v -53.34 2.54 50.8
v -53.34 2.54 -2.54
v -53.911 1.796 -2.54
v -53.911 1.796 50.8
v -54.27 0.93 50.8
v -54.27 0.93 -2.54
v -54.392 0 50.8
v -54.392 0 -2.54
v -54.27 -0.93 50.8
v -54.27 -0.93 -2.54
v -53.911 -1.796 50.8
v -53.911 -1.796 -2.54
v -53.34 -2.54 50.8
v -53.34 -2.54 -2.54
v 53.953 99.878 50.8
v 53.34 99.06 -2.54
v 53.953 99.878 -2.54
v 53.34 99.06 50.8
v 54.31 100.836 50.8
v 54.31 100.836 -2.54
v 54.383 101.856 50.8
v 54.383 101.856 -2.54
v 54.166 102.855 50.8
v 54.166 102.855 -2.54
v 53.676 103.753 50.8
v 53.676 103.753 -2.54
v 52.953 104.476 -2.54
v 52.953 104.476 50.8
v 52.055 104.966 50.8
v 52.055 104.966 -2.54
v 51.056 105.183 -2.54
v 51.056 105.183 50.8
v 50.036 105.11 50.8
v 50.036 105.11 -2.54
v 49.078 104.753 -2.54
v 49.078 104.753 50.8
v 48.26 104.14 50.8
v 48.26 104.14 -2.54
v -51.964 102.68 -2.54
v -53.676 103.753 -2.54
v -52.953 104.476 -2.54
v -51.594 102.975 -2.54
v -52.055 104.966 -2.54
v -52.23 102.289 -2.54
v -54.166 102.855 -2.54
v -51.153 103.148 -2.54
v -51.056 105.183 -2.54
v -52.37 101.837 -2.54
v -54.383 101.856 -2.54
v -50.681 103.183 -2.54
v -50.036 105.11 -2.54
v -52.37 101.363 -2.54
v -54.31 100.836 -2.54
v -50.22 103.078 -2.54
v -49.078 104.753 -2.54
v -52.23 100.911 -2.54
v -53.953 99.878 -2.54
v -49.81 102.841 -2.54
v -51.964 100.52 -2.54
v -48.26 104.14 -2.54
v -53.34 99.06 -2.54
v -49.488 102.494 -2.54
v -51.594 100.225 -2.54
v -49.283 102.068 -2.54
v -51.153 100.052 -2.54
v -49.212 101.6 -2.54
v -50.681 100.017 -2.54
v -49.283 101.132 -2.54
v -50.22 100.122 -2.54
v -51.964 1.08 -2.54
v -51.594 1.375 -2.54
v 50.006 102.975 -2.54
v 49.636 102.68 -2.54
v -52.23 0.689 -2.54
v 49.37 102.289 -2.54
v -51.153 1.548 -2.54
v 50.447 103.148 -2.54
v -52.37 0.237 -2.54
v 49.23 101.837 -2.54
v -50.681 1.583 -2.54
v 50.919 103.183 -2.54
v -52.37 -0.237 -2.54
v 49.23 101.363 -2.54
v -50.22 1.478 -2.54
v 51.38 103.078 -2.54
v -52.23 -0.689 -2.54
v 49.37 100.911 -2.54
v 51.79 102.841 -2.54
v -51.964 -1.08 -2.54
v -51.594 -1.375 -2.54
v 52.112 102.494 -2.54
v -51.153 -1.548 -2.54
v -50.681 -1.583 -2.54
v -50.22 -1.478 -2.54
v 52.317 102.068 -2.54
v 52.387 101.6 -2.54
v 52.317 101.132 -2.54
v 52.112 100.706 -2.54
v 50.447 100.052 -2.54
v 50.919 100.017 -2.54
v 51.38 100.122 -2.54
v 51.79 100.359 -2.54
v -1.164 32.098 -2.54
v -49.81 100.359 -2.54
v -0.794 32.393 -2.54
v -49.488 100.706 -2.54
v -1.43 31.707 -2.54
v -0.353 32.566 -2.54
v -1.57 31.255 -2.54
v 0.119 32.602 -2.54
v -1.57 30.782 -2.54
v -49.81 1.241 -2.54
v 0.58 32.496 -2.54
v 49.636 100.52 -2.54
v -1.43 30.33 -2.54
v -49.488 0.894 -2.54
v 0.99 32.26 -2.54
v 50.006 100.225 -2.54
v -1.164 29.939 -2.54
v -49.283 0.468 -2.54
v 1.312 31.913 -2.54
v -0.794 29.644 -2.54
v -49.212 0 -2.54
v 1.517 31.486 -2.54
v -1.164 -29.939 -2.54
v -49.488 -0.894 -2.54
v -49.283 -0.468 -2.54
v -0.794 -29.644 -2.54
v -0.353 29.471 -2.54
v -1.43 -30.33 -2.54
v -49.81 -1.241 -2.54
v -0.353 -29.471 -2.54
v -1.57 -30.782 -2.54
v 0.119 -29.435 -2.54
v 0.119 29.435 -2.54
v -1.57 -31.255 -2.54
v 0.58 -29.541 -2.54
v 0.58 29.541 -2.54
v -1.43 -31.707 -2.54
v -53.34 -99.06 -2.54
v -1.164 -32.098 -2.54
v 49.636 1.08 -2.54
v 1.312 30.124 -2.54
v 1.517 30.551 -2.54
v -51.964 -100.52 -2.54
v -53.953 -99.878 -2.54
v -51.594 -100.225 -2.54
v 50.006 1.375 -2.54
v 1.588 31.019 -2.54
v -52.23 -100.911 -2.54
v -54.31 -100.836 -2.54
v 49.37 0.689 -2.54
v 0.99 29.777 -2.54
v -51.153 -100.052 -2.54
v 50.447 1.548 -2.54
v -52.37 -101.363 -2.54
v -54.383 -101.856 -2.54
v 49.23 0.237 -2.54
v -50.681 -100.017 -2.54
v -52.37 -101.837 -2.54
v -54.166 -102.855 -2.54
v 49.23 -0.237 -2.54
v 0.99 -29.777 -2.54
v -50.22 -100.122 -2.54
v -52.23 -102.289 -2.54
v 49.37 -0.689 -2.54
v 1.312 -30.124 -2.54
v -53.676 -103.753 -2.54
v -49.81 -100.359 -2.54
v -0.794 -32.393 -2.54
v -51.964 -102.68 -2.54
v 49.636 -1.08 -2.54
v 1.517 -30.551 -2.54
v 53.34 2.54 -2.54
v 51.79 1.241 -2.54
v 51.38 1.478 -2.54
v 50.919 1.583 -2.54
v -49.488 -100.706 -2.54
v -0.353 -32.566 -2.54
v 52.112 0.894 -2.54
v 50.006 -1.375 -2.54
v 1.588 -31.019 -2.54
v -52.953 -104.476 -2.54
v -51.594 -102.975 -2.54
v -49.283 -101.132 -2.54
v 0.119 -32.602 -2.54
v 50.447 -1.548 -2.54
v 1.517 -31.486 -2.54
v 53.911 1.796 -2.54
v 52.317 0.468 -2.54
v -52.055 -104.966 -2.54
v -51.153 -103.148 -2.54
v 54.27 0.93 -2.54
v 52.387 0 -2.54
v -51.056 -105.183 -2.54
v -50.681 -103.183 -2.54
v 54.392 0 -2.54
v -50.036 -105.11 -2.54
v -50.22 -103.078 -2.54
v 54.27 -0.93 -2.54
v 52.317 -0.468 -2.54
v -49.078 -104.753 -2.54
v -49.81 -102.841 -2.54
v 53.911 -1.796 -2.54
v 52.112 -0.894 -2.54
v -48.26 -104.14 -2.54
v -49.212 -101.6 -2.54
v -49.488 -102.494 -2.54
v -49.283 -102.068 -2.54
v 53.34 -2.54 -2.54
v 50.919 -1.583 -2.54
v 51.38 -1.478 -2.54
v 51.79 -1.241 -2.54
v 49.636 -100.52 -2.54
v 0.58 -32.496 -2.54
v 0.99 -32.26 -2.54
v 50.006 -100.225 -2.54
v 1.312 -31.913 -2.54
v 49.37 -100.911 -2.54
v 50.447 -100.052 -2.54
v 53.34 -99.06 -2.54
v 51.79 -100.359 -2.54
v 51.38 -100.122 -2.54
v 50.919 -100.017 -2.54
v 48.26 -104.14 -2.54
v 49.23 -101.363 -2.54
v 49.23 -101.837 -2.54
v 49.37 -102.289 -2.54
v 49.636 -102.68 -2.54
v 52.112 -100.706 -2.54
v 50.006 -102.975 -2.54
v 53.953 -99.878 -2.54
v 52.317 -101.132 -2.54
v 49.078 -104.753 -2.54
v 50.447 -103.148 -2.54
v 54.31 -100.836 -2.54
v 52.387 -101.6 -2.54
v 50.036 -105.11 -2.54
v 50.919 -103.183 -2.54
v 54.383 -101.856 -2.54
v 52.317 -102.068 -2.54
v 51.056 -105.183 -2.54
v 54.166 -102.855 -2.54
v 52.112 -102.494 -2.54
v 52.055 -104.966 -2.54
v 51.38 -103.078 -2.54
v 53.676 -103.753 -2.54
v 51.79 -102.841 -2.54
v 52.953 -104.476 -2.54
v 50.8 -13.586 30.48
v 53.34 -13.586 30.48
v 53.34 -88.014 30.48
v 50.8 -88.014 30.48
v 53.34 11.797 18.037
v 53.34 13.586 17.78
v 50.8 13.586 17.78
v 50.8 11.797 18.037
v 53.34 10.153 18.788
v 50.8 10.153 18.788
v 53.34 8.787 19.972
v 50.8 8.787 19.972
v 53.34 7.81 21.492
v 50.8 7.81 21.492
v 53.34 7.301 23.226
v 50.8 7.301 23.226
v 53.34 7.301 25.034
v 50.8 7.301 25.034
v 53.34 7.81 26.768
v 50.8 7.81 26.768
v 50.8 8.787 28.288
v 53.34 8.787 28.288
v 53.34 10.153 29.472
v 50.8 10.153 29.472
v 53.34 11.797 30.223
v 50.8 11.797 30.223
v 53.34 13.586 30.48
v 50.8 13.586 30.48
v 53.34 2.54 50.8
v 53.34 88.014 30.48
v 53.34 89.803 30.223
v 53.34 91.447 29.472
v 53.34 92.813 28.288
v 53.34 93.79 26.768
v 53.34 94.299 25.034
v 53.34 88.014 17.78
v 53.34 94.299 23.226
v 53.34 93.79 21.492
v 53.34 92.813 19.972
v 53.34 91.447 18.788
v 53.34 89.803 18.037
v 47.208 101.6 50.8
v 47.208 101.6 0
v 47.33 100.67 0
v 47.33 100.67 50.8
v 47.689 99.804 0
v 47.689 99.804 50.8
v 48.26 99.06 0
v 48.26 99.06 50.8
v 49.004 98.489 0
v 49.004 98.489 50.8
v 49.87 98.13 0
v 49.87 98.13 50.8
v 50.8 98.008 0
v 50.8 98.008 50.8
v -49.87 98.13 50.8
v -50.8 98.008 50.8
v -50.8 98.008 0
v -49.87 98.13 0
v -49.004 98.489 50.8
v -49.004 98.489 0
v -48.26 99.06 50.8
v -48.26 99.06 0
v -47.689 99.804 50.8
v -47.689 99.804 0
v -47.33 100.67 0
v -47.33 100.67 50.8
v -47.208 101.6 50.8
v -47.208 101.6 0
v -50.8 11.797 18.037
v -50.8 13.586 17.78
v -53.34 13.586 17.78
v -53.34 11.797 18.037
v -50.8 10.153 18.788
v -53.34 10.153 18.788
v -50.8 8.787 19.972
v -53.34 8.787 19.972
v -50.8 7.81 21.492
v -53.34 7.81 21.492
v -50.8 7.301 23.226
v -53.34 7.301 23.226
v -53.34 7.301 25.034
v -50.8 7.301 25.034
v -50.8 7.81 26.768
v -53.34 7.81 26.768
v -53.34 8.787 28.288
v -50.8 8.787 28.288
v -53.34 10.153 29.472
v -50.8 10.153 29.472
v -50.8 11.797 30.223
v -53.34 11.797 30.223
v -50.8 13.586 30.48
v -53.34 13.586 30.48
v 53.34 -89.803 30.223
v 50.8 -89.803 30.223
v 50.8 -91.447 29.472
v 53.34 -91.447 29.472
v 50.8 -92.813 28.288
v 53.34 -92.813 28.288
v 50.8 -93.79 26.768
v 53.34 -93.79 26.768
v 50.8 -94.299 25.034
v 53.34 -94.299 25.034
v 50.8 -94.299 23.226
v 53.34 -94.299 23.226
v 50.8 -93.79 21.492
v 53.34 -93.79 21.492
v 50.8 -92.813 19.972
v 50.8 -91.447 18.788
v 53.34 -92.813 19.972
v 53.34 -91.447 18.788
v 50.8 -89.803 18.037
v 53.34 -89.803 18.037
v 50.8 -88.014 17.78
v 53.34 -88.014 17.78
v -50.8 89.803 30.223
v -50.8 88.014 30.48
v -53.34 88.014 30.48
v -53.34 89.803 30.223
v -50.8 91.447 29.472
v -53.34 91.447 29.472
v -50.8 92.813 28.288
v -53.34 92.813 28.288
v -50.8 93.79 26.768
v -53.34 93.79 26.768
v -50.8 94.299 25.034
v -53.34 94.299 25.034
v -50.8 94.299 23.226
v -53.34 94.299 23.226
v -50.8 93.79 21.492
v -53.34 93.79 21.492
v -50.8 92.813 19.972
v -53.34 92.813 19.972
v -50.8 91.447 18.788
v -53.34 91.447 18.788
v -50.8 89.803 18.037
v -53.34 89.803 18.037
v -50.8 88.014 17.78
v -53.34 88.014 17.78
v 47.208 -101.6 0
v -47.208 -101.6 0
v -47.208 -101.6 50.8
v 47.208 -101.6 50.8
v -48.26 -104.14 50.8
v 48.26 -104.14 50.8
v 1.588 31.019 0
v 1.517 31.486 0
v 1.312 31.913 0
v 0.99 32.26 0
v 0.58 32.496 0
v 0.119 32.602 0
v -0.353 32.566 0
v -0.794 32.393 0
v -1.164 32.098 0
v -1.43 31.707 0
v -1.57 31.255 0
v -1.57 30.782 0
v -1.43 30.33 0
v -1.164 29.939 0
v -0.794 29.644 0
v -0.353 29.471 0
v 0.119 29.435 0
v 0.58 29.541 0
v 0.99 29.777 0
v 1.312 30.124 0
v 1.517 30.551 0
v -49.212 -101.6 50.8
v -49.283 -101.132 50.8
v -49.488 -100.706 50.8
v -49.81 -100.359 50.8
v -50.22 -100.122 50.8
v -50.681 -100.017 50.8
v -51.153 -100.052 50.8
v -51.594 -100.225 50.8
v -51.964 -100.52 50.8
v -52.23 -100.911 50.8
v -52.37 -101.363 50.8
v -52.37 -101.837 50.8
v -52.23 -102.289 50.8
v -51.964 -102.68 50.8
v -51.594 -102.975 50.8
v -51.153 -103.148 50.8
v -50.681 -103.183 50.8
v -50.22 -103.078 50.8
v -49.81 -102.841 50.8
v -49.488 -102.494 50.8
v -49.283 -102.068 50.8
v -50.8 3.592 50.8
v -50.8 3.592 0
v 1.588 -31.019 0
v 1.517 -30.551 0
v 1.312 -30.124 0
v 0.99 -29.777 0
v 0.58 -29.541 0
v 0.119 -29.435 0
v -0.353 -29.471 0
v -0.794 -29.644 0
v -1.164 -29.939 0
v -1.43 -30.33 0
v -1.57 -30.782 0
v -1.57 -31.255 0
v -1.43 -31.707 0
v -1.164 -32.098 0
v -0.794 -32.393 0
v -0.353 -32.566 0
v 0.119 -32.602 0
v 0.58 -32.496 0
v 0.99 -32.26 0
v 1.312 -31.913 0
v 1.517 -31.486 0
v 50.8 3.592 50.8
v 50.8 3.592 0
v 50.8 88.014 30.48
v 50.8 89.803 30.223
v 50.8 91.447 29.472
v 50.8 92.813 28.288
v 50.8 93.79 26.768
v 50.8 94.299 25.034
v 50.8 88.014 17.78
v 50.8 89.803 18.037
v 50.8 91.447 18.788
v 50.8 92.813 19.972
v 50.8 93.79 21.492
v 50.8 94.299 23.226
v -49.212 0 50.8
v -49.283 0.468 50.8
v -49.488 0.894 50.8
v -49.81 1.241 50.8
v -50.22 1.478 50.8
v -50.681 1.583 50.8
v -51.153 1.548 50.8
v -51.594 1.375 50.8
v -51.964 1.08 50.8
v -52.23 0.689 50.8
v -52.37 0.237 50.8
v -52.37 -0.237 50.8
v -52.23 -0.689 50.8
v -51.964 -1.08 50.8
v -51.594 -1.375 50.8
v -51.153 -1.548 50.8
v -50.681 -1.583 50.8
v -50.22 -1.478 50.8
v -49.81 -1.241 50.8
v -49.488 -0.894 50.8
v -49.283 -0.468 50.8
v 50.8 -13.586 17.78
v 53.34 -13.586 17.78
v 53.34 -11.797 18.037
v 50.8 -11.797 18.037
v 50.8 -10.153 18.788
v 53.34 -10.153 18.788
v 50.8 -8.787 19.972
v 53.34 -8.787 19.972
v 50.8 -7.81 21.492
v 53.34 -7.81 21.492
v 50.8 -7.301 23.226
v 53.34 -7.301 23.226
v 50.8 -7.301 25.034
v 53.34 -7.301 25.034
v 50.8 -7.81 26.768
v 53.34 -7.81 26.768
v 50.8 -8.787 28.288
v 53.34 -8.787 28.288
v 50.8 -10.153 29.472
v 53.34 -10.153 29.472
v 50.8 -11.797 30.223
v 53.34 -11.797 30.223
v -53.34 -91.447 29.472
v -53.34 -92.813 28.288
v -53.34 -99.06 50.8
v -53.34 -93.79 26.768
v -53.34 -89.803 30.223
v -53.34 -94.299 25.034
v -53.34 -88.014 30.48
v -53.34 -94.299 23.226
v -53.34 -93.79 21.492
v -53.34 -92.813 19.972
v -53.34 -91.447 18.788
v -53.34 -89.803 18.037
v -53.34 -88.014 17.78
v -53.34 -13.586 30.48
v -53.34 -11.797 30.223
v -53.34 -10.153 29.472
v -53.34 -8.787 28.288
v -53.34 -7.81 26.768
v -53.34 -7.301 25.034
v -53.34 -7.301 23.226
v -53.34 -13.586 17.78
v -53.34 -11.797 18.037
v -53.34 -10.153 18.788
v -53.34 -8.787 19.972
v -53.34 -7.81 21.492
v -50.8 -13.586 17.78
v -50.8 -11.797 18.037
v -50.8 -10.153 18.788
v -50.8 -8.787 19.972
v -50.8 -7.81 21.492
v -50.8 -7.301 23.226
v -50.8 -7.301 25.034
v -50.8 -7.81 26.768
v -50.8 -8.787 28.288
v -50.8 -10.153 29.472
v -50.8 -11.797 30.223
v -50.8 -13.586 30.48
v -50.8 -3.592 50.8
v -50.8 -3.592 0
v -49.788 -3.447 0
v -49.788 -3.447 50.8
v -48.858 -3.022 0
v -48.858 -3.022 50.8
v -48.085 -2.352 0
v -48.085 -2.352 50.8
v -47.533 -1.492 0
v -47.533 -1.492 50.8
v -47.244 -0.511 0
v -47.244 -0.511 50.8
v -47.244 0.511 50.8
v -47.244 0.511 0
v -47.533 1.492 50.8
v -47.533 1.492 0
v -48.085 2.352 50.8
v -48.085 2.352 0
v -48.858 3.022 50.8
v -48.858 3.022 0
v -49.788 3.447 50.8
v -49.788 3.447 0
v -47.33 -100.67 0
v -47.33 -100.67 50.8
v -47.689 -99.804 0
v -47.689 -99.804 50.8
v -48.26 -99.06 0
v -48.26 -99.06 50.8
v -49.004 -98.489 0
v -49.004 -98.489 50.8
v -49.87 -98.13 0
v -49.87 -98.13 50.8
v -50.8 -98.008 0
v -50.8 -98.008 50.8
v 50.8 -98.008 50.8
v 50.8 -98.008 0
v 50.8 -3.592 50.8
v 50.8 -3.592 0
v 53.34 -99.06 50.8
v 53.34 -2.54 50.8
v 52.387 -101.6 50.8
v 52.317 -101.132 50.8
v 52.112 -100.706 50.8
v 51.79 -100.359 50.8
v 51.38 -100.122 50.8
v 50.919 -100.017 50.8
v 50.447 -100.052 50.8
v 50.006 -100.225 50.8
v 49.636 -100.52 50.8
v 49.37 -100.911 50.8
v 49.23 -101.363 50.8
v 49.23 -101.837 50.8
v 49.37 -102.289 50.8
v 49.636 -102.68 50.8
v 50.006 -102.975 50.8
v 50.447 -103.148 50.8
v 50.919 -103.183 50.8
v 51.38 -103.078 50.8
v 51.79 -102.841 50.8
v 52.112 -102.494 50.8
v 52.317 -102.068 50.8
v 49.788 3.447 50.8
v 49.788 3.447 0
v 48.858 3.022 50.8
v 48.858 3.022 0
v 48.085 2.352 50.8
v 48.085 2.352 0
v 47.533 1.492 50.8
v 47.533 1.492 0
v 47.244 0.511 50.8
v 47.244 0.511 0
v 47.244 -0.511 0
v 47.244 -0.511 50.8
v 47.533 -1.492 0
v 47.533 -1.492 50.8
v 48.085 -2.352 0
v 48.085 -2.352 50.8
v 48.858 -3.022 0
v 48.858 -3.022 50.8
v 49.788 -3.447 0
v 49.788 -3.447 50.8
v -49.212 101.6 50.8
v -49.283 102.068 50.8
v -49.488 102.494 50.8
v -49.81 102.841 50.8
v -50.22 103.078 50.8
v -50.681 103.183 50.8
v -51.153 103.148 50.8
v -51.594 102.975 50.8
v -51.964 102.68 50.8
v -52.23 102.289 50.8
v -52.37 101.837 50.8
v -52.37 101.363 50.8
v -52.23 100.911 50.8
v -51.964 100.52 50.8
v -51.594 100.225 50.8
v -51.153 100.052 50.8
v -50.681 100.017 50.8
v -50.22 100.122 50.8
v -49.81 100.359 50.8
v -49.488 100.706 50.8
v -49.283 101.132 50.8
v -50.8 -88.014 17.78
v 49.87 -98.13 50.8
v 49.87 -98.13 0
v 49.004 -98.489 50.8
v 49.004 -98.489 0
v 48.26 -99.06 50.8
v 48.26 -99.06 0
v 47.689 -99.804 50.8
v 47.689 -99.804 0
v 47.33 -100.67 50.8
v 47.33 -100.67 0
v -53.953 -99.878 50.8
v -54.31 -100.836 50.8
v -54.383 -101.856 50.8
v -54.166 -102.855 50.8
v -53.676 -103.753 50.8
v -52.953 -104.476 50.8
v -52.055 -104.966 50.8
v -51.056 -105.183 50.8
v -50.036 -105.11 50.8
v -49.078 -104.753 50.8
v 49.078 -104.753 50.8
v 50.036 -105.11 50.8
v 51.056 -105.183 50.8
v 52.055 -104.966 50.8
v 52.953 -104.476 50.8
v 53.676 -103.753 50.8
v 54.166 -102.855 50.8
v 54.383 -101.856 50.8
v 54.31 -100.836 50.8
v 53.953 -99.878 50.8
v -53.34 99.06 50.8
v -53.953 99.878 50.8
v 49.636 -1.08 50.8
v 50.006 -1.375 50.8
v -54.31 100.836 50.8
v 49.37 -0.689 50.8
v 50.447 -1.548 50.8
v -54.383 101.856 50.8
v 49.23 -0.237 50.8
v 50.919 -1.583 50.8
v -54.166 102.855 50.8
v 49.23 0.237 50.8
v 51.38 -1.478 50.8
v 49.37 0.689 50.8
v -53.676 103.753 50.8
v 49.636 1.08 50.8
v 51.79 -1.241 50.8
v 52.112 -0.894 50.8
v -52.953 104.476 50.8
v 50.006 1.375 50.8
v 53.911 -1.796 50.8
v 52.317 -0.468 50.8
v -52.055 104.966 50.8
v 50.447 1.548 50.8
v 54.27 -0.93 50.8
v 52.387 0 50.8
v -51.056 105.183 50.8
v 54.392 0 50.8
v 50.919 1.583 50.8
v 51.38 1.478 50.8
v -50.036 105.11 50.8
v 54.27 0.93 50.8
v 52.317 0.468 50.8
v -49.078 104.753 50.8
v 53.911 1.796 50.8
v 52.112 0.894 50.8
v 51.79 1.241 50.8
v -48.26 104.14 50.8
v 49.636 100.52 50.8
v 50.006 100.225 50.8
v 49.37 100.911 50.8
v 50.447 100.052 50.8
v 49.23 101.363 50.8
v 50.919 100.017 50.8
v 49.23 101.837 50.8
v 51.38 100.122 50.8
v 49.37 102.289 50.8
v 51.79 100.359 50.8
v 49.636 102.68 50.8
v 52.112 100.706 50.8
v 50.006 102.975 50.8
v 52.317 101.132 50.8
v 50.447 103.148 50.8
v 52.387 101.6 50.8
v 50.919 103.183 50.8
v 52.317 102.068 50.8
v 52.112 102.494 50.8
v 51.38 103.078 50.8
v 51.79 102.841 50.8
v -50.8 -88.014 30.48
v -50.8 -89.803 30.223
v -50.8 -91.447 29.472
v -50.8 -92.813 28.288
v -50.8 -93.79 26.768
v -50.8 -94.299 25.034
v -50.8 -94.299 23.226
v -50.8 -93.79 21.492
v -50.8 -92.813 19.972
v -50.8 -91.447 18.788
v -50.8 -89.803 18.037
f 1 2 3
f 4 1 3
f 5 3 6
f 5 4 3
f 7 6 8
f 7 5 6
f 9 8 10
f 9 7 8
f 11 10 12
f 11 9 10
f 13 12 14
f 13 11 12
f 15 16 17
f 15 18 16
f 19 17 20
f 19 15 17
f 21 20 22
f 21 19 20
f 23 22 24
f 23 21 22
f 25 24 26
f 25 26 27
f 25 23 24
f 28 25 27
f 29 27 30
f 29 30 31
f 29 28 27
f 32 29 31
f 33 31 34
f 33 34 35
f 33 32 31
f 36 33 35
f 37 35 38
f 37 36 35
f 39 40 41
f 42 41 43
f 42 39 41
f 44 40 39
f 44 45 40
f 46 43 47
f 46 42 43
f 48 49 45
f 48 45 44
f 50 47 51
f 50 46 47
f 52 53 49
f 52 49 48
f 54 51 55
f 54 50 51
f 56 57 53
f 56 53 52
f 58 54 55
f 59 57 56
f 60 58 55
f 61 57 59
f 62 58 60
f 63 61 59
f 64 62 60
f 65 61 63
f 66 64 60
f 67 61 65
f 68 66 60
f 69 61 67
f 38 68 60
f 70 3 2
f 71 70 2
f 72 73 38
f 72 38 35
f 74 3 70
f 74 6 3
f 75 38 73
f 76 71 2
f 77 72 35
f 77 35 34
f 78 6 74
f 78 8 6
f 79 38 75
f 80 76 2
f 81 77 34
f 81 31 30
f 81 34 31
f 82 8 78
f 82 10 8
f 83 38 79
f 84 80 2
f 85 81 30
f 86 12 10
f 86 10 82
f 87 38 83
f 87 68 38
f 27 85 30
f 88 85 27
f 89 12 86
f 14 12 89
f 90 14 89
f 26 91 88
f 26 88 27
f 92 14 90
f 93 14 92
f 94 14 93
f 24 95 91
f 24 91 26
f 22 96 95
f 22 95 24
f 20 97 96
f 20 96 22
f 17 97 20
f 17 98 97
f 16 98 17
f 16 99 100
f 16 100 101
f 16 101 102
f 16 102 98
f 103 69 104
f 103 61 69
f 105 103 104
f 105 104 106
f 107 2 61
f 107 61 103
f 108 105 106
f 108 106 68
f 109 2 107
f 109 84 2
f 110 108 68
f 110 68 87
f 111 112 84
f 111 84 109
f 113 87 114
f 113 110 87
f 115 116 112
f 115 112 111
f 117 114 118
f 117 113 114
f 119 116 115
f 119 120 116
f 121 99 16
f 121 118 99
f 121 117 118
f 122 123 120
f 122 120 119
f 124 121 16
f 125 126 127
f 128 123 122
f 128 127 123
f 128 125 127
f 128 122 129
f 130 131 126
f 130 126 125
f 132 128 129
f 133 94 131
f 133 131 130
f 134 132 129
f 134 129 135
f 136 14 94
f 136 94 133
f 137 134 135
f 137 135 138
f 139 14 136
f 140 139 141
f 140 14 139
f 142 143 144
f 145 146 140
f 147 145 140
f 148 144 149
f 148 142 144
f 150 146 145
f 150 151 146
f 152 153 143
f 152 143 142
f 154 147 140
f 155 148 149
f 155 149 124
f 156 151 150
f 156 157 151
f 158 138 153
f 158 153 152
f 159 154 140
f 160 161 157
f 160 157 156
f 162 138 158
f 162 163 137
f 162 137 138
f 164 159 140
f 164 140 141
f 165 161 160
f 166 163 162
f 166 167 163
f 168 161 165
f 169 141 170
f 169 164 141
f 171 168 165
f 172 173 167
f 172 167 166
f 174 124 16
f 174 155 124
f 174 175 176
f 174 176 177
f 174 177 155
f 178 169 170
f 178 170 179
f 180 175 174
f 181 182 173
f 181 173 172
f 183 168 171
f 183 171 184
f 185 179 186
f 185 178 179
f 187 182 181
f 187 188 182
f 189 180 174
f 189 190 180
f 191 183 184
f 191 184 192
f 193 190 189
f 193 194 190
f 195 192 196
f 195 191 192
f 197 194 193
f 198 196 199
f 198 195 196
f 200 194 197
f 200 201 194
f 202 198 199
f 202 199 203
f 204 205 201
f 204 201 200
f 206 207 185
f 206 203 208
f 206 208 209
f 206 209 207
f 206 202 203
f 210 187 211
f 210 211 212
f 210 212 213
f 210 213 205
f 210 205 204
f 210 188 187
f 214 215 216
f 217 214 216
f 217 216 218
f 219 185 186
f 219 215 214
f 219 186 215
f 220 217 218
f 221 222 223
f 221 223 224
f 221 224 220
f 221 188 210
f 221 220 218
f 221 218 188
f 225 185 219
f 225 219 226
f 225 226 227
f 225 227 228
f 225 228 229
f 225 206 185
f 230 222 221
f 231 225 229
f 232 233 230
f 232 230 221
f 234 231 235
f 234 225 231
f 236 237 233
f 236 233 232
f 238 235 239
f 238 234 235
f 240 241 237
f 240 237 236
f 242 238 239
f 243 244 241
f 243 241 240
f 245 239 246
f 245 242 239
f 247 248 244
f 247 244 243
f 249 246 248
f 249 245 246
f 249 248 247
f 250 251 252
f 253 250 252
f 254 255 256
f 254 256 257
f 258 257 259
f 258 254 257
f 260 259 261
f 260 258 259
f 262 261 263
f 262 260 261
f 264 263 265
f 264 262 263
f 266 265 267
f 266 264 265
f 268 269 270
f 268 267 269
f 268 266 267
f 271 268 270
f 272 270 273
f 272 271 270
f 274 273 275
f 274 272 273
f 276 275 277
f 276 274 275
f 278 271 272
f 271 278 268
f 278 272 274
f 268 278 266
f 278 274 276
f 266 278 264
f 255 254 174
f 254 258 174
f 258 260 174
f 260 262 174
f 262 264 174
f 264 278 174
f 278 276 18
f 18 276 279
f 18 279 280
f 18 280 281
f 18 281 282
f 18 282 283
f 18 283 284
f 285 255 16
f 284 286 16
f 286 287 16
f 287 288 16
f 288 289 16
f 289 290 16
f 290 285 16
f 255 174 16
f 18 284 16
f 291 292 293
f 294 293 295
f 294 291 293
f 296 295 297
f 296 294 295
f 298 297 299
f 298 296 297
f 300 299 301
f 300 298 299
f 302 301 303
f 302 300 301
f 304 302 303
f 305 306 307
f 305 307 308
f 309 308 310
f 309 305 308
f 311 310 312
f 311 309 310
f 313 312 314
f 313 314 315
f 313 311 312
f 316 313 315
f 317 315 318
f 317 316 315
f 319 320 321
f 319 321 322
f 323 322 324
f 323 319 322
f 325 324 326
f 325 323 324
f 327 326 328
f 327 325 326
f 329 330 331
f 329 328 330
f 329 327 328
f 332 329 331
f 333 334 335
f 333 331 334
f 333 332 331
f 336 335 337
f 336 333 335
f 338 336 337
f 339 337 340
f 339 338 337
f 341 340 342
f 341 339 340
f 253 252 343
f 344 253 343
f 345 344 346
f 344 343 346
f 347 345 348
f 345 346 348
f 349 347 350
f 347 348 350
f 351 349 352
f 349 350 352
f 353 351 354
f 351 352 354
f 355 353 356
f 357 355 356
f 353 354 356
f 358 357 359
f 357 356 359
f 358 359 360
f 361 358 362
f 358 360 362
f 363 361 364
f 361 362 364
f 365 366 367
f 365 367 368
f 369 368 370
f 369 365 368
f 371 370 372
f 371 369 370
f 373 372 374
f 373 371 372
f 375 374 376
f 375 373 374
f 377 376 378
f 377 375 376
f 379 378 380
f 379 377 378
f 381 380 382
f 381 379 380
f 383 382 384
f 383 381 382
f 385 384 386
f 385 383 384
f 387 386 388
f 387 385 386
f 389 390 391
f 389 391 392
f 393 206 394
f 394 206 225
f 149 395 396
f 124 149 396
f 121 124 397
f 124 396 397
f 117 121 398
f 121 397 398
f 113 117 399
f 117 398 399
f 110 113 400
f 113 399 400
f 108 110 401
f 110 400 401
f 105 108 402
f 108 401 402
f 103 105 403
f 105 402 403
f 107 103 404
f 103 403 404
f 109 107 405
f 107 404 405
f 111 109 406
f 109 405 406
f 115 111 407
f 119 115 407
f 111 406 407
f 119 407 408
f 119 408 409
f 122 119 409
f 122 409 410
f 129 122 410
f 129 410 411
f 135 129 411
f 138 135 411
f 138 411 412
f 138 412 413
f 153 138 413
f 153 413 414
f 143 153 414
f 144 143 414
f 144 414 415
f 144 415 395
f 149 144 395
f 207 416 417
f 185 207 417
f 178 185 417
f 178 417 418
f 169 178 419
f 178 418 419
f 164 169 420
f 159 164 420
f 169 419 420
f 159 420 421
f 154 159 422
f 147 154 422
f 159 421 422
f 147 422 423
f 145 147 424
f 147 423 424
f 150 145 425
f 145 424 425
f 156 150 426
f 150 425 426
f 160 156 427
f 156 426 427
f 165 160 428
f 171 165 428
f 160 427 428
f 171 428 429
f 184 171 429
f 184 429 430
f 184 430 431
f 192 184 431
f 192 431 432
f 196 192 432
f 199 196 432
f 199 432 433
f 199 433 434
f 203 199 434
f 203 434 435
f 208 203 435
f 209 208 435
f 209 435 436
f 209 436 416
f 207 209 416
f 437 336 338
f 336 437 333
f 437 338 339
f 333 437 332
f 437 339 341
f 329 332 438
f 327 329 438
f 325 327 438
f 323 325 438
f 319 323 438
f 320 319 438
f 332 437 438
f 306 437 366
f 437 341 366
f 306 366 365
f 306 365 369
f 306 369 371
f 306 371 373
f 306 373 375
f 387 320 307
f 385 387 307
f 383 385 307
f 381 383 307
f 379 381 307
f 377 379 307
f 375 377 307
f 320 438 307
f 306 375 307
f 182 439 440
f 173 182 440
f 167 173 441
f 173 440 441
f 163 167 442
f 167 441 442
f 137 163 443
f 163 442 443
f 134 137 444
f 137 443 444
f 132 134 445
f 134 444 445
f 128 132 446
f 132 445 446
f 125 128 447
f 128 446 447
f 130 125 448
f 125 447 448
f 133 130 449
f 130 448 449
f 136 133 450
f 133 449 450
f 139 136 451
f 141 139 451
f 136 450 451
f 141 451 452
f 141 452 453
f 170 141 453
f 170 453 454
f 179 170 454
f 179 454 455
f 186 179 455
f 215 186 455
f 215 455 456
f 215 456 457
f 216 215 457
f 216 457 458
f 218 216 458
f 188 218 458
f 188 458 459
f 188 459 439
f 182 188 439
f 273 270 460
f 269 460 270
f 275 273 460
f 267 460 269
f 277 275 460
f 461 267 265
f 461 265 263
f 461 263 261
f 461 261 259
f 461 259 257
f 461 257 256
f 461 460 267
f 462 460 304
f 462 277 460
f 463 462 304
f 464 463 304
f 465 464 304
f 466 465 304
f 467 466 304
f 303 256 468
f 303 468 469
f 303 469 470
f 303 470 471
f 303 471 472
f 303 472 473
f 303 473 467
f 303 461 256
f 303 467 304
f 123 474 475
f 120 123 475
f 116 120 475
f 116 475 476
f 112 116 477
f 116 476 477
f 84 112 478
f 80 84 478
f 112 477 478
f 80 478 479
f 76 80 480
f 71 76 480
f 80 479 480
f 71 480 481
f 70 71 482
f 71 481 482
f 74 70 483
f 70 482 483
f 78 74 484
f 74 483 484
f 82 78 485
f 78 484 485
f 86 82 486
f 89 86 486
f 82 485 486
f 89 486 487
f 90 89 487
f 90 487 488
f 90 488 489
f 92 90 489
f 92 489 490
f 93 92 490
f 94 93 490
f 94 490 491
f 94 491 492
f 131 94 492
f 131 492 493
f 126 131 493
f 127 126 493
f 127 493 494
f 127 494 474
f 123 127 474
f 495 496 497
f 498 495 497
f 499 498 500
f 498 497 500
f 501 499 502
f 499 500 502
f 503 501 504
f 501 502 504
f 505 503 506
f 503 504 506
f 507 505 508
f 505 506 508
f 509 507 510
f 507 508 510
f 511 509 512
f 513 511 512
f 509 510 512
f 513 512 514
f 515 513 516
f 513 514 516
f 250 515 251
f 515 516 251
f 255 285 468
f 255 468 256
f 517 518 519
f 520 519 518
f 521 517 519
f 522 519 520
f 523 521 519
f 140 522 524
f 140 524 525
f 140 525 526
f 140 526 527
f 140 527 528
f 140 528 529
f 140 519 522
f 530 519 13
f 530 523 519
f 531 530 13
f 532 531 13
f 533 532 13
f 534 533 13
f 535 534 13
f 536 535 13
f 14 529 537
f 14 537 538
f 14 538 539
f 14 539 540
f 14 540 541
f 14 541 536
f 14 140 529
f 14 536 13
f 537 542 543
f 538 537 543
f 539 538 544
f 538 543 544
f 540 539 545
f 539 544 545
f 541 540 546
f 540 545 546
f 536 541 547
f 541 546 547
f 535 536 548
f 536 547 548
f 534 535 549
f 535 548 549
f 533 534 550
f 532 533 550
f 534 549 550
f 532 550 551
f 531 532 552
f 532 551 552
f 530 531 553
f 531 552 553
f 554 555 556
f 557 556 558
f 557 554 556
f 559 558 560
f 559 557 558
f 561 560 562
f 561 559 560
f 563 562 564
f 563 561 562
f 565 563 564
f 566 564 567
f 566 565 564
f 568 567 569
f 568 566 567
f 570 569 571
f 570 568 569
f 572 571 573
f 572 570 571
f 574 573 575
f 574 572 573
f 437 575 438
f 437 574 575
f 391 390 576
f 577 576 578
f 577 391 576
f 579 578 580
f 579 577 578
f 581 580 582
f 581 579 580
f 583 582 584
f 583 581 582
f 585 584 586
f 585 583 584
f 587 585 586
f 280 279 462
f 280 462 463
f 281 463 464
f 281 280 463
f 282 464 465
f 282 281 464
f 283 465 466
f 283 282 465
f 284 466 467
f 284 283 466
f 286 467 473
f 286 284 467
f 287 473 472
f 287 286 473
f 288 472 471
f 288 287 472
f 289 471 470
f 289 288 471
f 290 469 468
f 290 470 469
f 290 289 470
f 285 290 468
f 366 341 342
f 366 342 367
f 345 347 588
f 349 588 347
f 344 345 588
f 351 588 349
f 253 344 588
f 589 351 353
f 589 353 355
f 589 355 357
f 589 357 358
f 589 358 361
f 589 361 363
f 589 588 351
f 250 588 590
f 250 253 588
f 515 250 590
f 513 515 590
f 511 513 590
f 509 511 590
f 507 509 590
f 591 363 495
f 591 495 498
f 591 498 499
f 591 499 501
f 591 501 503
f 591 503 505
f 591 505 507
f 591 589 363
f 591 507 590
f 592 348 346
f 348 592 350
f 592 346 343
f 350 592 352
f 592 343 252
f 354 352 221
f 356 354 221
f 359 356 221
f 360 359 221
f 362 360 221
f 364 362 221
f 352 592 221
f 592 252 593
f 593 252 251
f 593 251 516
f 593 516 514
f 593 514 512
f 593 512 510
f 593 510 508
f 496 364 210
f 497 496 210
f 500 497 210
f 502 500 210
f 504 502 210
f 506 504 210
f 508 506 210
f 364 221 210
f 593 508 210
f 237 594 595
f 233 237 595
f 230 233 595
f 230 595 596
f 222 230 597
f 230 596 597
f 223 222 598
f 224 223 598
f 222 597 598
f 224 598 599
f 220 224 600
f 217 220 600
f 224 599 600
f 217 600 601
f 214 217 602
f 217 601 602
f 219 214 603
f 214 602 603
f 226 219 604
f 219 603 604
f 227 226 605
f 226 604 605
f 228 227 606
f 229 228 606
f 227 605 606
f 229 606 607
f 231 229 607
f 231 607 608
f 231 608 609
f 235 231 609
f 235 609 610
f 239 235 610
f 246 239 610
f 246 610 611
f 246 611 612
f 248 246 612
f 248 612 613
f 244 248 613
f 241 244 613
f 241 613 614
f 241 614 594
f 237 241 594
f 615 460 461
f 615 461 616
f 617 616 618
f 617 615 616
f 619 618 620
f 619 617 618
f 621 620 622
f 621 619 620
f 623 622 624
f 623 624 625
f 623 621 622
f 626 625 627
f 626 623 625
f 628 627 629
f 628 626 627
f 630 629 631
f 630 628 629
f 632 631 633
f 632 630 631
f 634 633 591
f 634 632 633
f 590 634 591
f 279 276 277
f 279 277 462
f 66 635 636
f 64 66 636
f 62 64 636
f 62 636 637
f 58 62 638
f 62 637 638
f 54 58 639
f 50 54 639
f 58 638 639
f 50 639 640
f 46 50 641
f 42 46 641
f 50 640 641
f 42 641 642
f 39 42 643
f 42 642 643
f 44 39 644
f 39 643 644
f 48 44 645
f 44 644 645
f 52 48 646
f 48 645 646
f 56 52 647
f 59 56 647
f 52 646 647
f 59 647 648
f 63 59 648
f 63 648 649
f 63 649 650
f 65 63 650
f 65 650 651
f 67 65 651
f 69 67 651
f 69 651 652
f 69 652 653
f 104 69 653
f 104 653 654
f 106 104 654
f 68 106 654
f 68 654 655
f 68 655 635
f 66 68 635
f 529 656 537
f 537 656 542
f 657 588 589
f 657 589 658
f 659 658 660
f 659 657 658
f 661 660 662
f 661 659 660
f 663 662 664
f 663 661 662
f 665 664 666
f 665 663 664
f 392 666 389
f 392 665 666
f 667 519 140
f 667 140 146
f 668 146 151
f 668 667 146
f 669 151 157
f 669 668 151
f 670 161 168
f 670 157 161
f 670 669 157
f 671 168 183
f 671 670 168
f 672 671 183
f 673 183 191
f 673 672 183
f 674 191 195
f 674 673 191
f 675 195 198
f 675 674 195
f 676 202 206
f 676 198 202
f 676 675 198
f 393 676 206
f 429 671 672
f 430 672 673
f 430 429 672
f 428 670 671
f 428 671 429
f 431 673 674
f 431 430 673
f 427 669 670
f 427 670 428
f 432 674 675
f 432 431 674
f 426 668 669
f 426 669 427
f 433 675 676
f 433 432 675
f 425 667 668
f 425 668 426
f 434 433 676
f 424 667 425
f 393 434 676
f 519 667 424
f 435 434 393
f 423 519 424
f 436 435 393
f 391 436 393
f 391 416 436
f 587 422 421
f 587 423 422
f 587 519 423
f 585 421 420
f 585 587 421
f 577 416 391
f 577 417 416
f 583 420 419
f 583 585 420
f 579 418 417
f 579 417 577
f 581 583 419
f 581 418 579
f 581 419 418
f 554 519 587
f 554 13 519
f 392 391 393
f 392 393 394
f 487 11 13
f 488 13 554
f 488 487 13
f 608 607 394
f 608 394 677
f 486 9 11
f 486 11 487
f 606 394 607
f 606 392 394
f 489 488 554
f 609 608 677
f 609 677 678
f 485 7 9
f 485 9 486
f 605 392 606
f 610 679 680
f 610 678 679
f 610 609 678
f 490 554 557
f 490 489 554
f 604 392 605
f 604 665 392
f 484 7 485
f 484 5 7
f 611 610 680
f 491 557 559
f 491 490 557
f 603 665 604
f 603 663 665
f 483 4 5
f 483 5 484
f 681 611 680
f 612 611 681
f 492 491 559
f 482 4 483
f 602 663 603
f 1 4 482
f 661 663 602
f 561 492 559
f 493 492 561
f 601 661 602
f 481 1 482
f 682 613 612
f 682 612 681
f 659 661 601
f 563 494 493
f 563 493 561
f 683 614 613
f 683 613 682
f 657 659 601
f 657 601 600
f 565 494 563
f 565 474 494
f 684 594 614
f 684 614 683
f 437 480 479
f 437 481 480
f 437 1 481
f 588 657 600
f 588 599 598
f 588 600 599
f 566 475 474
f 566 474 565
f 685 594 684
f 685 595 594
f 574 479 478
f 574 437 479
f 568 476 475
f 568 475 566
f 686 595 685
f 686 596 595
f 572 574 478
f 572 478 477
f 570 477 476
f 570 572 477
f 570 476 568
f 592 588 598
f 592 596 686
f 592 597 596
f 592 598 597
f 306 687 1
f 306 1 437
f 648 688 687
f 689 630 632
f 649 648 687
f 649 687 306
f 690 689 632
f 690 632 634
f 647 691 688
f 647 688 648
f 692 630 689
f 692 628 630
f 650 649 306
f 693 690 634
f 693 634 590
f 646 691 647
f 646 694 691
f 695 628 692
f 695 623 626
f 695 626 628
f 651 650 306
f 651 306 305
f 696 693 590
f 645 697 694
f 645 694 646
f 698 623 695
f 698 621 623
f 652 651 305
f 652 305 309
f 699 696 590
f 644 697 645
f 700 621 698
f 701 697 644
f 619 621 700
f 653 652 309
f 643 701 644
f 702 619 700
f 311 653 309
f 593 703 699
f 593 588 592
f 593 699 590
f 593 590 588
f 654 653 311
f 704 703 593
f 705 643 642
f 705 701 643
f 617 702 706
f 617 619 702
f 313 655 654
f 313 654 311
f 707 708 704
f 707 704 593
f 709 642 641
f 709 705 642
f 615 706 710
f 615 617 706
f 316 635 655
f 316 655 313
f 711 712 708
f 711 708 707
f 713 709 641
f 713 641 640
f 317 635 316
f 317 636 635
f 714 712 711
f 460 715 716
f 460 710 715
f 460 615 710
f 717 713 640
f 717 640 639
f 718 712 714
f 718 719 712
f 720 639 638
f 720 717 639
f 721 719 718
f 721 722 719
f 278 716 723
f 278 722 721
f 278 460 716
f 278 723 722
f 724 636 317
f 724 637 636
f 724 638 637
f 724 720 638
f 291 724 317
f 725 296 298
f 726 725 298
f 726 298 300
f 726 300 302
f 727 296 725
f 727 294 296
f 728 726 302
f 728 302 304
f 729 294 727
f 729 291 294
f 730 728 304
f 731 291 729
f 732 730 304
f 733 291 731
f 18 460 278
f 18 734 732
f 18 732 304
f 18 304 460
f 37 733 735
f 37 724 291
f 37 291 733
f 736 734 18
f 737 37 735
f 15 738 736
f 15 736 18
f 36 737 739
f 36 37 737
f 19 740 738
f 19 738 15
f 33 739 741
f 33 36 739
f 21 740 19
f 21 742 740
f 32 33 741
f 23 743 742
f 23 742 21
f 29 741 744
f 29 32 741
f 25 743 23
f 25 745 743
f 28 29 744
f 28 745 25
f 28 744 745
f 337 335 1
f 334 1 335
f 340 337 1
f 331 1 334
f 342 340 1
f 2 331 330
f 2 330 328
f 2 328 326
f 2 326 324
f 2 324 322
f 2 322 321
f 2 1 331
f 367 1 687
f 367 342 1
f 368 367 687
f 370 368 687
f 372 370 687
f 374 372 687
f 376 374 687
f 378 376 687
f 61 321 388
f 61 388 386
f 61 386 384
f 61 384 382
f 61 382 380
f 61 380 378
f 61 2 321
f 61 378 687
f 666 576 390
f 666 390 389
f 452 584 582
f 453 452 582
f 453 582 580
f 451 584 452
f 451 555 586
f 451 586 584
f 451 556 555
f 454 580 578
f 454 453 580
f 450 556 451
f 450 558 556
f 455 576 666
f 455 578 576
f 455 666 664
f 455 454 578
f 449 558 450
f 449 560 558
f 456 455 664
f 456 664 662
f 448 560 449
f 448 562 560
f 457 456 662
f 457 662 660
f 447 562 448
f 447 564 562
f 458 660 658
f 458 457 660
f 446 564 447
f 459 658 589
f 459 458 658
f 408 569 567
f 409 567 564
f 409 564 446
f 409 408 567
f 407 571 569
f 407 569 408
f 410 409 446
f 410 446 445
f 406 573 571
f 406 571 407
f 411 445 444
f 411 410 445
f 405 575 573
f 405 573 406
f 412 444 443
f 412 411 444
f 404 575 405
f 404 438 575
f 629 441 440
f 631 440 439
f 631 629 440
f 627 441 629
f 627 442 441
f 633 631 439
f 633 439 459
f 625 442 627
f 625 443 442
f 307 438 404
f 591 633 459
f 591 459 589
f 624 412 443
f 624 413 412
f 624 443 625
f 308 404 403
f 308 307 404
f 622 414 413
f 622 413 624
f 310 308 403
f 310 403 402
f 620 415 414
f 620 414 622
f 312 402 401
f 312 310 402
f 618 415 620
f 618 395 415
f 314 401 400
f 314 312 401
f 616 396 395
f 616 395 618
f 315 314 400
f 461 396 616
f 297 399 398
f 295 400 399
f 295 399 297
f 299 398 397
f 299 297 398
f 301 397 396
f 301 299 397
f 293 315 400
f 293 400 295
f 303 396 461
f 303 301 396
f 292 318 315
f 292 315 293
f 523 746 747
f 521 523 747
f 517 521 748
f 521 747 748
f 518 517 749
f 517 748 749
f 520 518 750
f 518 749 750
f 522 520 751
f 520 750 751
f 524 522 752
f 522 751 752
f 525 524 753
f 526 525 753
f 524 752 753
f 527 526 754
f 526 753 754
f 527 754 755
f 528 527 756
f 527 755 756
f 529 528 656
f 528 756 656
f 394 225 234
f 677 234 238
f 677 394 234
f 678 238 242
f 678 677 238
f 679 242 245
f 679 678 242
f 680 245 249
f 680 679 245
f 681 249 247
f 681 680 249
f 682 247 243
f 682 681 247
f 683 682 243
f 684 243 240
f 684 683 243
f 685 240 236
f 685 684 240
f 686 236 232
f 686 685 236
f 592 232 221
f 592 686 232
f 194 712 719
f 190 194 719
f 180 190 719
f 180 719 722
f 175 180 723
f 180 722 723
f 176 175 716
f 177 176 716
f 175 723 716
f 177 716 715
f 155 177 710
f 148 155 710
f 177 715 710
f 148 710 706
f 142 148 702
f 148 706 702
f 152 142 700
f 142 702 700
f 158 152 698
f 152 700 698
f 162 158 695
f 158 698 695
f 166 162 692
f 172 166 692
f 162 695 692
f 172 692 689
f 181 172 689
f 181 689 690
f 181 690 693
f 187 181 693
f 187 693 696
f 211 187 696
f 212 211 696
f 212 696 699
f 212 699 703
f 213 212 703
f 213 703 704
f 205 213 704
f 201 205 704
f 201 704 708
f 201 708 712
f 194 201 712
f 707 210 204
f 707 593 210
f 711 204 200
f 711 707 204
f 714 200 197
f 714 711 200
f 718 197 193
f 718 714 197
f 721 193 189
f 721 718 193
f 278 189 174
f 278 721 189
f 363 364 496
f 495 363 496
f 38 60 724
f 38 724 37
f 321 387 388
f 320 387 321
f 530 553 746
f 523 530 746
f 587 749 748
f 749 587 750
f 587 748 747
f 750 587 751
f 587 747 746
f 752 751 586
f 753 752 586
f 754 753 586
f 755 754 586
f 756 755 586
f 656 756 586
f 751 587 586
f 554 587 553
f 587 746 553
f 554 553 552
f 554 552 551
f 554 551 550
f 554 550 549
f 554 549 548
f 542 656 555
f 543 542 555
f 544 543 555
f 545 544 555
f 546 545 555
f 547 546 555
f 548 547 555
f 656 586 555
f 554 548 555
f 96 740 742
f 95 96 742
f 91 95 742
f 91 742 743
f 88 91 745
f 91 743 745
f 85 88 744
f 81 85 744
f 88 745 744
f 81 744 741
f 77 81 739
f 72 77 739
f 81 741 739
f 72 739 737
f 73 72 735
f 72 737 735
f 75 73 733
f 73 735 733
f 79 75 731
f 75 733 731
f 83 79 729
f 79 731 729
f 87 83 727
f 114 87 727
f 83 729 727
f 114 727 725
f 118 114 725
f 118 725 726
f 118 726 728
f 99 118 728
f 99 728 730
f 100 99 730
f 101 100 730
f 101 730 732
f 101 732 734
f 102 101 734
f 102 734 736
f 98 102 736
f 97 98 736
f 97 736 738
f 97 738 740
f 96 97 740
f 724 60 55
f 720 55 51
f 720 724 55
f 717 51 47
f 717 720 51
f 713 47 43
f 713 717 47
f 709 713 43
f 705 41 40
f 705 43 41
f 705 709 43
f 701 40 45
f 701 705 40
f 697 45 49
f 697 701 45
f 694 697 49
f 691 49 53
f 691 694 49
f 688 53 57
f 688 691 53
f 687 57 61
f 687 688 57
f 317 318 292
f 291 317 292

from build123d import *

# Parameters (mm, degrees)
SKETCH1_W           = 101.6
SKETCH1_H           = 203.2
BOSS_EXTRUDE1_DEPTH = 50.8
SHELL1_T            = 2.54
SKETCH2_R           = 1.5875
CUT_EXTRUDE1_DEPTH  = 50.8
BOSS_EXTRUDE2_REACH = 130.59
SKETCH3_R           = 3.592102448
SKETCH4_R           = 1.5875
CUT_EXTRUDE2_DEPTH  = 130.880848574
CUT_EXTRUDE3_DEPTH  = 159.909484662


with BuildPart() as part:
    # Sketch1 → Boss-Extrude1 (new body)
    with BuildSketch(Plane.XY):
        Rectangle(SKETCH1_W, SKETCH1_H)
    extrude(amount=BOSS_EXTRUDE1_DEPTH)

    # Shell1
    shell1_openings = [part.faces().sort_by_distance(p)[0] for p in [
        (0, 0, 50.8),
    ]]
    offset(amount=SHELL1_T, openings=shell1_openings, kind=Kind.INTERSECTION)

    # Sketch2 → Cut-Extrude1 (cut)
    with BuildSketch(Plane.XY):
        with Locations((0, 31.018508685)):
            Circle(SKETCH2_R)
        with Locations((0, -31.018508685)):
            Circle(SKETCH2_R)
    extrude(amount=-CUT_EXTRUDE1_DEPTH, mode=Mode.SUBTRACT)

    # Boss-Extrude2: up to this face of the body (flat: up to its plane)
    boss_extrude2_end = Plane(part.part.faces().sort_by_distance((0, 0, -2.54))[0])
    # Sketch3 → Boss-Extrude2 (add, up to the picked face)
    with BuildSketch(Plane.XY.offset(50.8), mode=Mode.PRIVATE) as boss_extrude2_sk1:
        with Locations((-50.8, 101.6)):
            Circle(SKETCH3_R)
    boss_extrude2_tool1 = split(extrude(boss_extrude2_sk1.sketch, amount=-BOSS_EXTRUDE2_REACH, mode=Mode.PRIVATE), bisect_by=boss_extrude2_end, keep=Keep.BOTH, mode=Mode.PRIVATE)
    # Sketch3 → Boss-Extrude2 (add, up to the picked face)
    with BuildSketch(Plane.XY.offset(50.8), mode=Mode.PRIVATE) as boss_extrude2_sk2:
        with Locations((50.8, 101.6)):
            Circle(SKETCH3_R)
    boss_extrude2_tool2 = split(extrude(boss_extrude2_sk2.sketch, amount=-BOSS_EXTRUDE2_REACH, mode=Mode.PRIVATE), bisect_by=boss_extrude2_end, keep=Keep.BOTH, mode=Mode.PRIVATE)
    # Sketch3 → Boss-Extrude2 (add, up to the picked face)
    with BuildSketch(Plane.XY.offset(50.8), mode=Mode.PRIVATE) as boss_extrude2_sk3:
        with Locations((50.8, -101.6)):
            Circle(SKETCH3_R)
    boss_extrude2_tool3 = split(extrude(boss_extrude2_sk3.sketch, amount=-BOSS_EXTRUDE2_REACH, mode=Mode.PRIVATE), bisect_by=boss_extrude2_end, keep=Keep.BOTH, mode=Mode.PRIVATE)
    # Sketch3 → Boss-Extrude2 (add, up to the picked face)
    with BuildSketch(Plane.XY.offset(50.8), mode=Mode.PRIVATE) as boss_extrude2_sk4:
        with Locations((-50.8, -101.6)):
            Circle(SKETCH3_R)
    boss_extrude2_tool4 = split(extrude(boss_extrude2_sk4.sketch, amount=-BOSS_EXTRUDE2_REACH, mode=Mode.PRIVATE), bisect_by=boss_extrude2_end, keep=Keep.BOTH, mode=Mode.PRIVATE)
    # Sketch3 → Boss-Extrude2 (add, up to the picked face)
    with BuildSketch(Plane.XY.offset(50.8), mode=Mode.PRIVATE) as boss_extrude2_sk5:
        with Locations((-50.8, 0)):
            Circle(SKETCH3_R)
    boss_extrude2_tool5 = split(extrude(boss_extrude2_sk5.sketch, amount=-BOSS_EXTRUDE2_REACH, mode=Mode.PRIVATE), bisect_by=boss_extrude2_end, keep=Keep.BOTH, mode=Mode.PRIVATE)
    # Sketch3 → Boss-Extrude2 (add, up to the picked face)
    with BuildSketch(Plane.XY.offset(50.8), mode=Mode.PRIVATE) as boss_extrude2_sk6:
        with Locations((50.8, 0)):
            Circle(SKETCH3_R)
    boss_extrude2_tool6 = split(extrude(boss_extrude2_sk6.sketch, amount=-BOSS_EXTRUDE2_REACH, mode=Mode.PRIVATE), bisect_by=boss_extrude2_end, keep=Keep.BOTH, mode=Mode.PRIVATE)
    add(boss_extrude2_tool1.solids().sort_by(Axis((-50.8, 101.6, 50.8), (0, 0, -1)))[0])
    add(boss_extrude2_tool2.solids().sort_by(Axis((50.8, 101.6, 50.8), (0, 0, -1)))[0])
    add(boss_extrude2_tool3.solids().sort_by(Axis((50.8, -101.6, 50.8), (0, 0, -1)))[0])
    add(boss_extrude2_tool4.solids().sort_by(Axis((-50.8, -101.6, 50.8), (0, 0, -1)))[0])
    add(boss_extrude2_tool5.solids().sort_by(Axis((-50.8, 0, 50.8), (0, 0, -1)))[0])
    add(boss_extrude2_tool6.solids().sort_by(Axis((50.8, 0, 50.8), (0, 0, -1)))[0])

    # Sketch4 → Cut-Extrude2 (cut, through all)
    with BuildSketch(Plane.XY.offset(50.8)):
        with Locations((-50.8, 0)):
            Circle(SKETCH4_R)
        with Locations((50.8, 0)):
            Circle(SKETCH4_R)
        with Locations((50.8, 101.6)):
            Circle(SKETCH4_R)
        with Locations((-50.8, 101.6)):
            Circle(SKETCH4_R)
        with Locations((50.8, -101.6)):
            Circle(SKETCH4_R)
        with Locations((-50.8, -101.6)):
            Circle(SKETCH4_R)
    extrude(amount=-CUT_EXTRUDE2_DEPTH, mode=Mode.SUBTRACT)

    # Sketch5 → Cut-Extrude3 (cut, through all)
    with BuildSketch(Plane(origin=(53.34, 0, 0), x_dir=(0, 0, -1), z_dir=(1, 0, 0))):
        with BuildLine():
            Line((-17.78, 88.01360889), (-17.78, 13.58639111))
            ThreePointArc((-17.78, 13.58639111), (-24.13, 7.23639111), (-30.48, 13.58639111))
            Line((-30.48, 13.58639111), (-30.48, 88.01360889))
            ThreePointArc((-30.48, 88.01360889), (-24.13, 94.36360889), (-17.78, 88.01360889))
        make_face()
    cut_extrude3 = extrude(amount=-CUT_EXTRUDE3_DEPTH, mode=Mode.SUBTRACT)

    # Mirror1: Cut-Extrude3 across plane
    add(cut_extrude3.mirror(Plane.ZX), mode=Mode.SUBTRACT)


solid = part.part
